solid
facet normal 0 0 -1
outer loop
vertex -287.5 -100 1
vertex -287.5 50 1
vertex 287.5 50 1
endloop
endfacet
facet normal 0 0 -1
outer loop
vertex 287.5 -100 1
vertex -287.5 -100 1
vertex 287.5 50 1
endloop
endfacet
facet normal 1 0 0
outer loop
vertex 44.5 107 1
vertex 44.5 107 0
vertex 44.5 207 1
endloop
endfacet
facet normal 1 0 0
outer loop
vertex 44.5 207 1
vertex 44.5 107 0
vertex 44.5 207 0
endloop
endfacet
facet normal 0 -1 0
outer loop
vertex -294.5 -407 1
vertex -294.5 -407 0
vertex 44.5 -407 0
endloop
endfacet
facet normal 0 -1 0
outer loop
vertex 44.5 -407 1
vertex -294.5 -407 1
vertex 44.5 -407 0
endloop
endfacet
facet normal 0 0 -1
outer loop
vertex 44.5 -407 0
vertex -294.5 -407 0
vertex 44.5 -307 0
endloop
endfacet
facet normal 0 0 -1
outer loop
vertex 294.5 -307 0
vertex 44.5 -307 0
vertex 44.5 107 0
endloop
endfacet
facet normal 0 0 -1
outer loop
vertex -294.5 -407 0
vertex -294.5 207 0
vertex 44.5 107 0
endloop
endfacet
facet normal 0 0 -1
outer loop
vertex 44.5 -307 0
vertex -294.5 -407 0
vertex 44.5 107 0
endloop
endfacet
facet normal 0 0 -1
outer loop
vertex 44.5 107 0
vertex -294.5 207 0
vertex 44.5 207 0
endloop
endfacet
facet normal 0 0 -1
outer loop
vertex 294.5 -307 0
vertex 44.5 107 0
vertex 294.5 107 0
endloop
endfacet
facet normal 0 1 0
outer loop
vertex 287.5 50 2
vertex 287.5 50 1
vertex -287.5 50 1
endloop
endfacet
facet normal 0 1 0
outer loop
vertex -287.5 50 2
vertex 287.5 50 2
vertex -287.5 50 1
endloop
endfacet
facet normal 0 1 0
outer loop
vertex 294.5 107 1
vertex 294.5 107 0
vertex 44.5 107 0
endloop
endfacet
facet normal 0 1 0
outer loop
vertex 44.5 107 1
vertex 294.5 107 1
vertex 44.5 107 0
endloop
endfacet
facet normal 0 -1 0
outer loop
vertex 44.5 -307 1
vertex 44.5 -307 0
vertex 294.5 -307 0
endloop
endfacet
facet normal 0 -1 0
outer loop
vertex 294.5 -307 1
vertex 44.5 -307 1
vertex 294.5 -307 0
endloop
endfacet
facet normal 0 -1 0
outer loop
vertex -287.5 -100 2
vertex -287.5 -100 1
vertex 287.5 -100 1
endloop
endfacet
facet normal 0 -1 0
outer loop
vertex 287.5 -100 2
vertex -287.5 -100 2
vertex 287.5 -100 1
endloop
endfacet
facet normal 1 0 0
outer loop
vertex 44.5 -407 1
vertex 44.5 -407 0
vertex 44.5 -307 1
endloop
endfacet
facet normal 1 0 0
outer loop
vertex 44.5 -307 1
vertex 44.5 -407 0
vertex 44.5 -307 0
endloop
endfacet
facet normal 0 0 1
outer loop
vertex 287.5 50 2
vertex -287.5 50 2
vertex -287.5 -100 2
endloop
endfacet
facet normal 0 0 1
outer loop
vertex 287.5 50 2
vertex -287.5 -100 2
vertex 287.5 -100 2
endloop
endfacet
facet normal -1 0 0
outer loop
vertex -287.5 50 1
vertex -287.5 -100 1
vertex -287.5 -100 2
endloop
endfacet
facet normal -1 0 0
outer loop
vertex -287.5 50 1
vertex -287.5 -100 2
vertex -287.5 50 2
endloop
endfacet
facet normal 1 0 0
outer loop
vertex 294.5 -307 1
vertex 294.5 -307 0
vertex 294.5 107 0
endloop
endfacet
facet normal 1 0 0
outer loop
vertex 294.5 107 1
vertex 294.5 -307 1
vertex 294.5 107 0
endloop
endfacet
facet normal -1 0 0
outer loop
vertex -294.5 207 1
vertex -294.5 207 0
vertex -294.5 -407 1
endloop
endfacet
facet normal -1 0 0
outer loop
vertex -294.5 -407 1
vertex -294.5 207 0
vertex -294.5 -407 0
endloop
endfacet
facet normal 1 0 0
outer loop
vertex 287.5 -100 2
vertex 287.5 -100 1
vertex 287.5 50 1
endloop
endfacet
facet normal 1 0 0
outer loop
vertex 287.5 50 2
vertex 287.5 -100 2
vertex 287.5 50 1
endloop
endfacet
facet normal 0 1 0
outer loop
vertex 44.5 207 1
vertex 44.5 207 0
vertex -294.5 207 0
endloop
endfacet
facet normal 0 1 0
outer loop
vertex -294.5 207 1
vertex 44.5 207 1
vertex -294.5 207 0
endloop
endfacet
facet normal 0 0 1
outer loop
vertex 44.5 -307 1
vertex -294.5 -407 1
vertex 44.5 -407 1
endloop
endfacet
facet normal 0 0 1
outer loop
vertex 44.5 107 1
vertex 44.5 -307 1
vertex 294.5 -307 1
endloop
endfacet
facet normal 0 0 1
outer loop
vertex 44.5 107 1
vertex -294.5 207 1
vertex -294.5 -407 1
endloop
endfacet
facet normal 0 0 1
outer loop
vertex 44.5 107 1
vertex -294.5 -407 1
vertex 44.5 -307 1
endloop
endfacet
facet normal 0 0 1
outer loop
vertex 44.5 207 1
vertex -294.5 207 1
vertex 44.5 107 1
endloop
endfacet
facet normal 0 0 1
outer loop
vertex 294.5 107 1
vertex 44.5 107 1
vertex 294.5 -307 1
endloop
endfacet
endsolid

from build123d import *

# Parameters (mm, degrees)
F0_W     = 100
F0_H     = 31
F2_DEPTH = 1
F3_START = 1
F1_W     = 325
F1_H     = 150
F1_W_2   = 250
F3_DEPTH = 1


with BuildPart() as f2:
    # F0 (on Top) → F2 (new body)
    with BuildSketch(Plane.XY):
        Polygon((-294.5, 100), (-294.5, -100), (-294.5, -300), (-294.5, -407), (44.5, -407), (44.5, -307), (294.5, -307), (294.5, -100), (294.5, 107), (44.5, 107), (44.5, 207), (-294.5, 207), align=None)
        with Locations((212.5101804733, -57.5)):
            Rectangle(F0_W, F0_H, mode=Mode.SUBTRACT)
        with Locations((212.5101804733, 57.5)):
            Rectangle(F0_W, F0_H, mode=Mode.SUBTRACT)
        with Locations((212.5101804733, 57.5)):
            Rectangle(F0_W, F0_H)
        with Locations((212.5101804733, -57.5)):
            Rectangle(F0_W, F0_H)
    extrude(amount=F2_DEPTH)


with BuildPart() as f3:
    # F1 (on Top) → F3 (new body)
    with BuildSketch(Plane.XY.offset(F3_START)):
        with Locations((-125, -25)):
            Rectangle(F1_W, F1_H)
        with Locations((162.5, -25)):
            Rectangle(F1_W_2, F1_H)
    extrude(amount=F3_DEPTH)


solid = Compound([f2.part, f3.part])
